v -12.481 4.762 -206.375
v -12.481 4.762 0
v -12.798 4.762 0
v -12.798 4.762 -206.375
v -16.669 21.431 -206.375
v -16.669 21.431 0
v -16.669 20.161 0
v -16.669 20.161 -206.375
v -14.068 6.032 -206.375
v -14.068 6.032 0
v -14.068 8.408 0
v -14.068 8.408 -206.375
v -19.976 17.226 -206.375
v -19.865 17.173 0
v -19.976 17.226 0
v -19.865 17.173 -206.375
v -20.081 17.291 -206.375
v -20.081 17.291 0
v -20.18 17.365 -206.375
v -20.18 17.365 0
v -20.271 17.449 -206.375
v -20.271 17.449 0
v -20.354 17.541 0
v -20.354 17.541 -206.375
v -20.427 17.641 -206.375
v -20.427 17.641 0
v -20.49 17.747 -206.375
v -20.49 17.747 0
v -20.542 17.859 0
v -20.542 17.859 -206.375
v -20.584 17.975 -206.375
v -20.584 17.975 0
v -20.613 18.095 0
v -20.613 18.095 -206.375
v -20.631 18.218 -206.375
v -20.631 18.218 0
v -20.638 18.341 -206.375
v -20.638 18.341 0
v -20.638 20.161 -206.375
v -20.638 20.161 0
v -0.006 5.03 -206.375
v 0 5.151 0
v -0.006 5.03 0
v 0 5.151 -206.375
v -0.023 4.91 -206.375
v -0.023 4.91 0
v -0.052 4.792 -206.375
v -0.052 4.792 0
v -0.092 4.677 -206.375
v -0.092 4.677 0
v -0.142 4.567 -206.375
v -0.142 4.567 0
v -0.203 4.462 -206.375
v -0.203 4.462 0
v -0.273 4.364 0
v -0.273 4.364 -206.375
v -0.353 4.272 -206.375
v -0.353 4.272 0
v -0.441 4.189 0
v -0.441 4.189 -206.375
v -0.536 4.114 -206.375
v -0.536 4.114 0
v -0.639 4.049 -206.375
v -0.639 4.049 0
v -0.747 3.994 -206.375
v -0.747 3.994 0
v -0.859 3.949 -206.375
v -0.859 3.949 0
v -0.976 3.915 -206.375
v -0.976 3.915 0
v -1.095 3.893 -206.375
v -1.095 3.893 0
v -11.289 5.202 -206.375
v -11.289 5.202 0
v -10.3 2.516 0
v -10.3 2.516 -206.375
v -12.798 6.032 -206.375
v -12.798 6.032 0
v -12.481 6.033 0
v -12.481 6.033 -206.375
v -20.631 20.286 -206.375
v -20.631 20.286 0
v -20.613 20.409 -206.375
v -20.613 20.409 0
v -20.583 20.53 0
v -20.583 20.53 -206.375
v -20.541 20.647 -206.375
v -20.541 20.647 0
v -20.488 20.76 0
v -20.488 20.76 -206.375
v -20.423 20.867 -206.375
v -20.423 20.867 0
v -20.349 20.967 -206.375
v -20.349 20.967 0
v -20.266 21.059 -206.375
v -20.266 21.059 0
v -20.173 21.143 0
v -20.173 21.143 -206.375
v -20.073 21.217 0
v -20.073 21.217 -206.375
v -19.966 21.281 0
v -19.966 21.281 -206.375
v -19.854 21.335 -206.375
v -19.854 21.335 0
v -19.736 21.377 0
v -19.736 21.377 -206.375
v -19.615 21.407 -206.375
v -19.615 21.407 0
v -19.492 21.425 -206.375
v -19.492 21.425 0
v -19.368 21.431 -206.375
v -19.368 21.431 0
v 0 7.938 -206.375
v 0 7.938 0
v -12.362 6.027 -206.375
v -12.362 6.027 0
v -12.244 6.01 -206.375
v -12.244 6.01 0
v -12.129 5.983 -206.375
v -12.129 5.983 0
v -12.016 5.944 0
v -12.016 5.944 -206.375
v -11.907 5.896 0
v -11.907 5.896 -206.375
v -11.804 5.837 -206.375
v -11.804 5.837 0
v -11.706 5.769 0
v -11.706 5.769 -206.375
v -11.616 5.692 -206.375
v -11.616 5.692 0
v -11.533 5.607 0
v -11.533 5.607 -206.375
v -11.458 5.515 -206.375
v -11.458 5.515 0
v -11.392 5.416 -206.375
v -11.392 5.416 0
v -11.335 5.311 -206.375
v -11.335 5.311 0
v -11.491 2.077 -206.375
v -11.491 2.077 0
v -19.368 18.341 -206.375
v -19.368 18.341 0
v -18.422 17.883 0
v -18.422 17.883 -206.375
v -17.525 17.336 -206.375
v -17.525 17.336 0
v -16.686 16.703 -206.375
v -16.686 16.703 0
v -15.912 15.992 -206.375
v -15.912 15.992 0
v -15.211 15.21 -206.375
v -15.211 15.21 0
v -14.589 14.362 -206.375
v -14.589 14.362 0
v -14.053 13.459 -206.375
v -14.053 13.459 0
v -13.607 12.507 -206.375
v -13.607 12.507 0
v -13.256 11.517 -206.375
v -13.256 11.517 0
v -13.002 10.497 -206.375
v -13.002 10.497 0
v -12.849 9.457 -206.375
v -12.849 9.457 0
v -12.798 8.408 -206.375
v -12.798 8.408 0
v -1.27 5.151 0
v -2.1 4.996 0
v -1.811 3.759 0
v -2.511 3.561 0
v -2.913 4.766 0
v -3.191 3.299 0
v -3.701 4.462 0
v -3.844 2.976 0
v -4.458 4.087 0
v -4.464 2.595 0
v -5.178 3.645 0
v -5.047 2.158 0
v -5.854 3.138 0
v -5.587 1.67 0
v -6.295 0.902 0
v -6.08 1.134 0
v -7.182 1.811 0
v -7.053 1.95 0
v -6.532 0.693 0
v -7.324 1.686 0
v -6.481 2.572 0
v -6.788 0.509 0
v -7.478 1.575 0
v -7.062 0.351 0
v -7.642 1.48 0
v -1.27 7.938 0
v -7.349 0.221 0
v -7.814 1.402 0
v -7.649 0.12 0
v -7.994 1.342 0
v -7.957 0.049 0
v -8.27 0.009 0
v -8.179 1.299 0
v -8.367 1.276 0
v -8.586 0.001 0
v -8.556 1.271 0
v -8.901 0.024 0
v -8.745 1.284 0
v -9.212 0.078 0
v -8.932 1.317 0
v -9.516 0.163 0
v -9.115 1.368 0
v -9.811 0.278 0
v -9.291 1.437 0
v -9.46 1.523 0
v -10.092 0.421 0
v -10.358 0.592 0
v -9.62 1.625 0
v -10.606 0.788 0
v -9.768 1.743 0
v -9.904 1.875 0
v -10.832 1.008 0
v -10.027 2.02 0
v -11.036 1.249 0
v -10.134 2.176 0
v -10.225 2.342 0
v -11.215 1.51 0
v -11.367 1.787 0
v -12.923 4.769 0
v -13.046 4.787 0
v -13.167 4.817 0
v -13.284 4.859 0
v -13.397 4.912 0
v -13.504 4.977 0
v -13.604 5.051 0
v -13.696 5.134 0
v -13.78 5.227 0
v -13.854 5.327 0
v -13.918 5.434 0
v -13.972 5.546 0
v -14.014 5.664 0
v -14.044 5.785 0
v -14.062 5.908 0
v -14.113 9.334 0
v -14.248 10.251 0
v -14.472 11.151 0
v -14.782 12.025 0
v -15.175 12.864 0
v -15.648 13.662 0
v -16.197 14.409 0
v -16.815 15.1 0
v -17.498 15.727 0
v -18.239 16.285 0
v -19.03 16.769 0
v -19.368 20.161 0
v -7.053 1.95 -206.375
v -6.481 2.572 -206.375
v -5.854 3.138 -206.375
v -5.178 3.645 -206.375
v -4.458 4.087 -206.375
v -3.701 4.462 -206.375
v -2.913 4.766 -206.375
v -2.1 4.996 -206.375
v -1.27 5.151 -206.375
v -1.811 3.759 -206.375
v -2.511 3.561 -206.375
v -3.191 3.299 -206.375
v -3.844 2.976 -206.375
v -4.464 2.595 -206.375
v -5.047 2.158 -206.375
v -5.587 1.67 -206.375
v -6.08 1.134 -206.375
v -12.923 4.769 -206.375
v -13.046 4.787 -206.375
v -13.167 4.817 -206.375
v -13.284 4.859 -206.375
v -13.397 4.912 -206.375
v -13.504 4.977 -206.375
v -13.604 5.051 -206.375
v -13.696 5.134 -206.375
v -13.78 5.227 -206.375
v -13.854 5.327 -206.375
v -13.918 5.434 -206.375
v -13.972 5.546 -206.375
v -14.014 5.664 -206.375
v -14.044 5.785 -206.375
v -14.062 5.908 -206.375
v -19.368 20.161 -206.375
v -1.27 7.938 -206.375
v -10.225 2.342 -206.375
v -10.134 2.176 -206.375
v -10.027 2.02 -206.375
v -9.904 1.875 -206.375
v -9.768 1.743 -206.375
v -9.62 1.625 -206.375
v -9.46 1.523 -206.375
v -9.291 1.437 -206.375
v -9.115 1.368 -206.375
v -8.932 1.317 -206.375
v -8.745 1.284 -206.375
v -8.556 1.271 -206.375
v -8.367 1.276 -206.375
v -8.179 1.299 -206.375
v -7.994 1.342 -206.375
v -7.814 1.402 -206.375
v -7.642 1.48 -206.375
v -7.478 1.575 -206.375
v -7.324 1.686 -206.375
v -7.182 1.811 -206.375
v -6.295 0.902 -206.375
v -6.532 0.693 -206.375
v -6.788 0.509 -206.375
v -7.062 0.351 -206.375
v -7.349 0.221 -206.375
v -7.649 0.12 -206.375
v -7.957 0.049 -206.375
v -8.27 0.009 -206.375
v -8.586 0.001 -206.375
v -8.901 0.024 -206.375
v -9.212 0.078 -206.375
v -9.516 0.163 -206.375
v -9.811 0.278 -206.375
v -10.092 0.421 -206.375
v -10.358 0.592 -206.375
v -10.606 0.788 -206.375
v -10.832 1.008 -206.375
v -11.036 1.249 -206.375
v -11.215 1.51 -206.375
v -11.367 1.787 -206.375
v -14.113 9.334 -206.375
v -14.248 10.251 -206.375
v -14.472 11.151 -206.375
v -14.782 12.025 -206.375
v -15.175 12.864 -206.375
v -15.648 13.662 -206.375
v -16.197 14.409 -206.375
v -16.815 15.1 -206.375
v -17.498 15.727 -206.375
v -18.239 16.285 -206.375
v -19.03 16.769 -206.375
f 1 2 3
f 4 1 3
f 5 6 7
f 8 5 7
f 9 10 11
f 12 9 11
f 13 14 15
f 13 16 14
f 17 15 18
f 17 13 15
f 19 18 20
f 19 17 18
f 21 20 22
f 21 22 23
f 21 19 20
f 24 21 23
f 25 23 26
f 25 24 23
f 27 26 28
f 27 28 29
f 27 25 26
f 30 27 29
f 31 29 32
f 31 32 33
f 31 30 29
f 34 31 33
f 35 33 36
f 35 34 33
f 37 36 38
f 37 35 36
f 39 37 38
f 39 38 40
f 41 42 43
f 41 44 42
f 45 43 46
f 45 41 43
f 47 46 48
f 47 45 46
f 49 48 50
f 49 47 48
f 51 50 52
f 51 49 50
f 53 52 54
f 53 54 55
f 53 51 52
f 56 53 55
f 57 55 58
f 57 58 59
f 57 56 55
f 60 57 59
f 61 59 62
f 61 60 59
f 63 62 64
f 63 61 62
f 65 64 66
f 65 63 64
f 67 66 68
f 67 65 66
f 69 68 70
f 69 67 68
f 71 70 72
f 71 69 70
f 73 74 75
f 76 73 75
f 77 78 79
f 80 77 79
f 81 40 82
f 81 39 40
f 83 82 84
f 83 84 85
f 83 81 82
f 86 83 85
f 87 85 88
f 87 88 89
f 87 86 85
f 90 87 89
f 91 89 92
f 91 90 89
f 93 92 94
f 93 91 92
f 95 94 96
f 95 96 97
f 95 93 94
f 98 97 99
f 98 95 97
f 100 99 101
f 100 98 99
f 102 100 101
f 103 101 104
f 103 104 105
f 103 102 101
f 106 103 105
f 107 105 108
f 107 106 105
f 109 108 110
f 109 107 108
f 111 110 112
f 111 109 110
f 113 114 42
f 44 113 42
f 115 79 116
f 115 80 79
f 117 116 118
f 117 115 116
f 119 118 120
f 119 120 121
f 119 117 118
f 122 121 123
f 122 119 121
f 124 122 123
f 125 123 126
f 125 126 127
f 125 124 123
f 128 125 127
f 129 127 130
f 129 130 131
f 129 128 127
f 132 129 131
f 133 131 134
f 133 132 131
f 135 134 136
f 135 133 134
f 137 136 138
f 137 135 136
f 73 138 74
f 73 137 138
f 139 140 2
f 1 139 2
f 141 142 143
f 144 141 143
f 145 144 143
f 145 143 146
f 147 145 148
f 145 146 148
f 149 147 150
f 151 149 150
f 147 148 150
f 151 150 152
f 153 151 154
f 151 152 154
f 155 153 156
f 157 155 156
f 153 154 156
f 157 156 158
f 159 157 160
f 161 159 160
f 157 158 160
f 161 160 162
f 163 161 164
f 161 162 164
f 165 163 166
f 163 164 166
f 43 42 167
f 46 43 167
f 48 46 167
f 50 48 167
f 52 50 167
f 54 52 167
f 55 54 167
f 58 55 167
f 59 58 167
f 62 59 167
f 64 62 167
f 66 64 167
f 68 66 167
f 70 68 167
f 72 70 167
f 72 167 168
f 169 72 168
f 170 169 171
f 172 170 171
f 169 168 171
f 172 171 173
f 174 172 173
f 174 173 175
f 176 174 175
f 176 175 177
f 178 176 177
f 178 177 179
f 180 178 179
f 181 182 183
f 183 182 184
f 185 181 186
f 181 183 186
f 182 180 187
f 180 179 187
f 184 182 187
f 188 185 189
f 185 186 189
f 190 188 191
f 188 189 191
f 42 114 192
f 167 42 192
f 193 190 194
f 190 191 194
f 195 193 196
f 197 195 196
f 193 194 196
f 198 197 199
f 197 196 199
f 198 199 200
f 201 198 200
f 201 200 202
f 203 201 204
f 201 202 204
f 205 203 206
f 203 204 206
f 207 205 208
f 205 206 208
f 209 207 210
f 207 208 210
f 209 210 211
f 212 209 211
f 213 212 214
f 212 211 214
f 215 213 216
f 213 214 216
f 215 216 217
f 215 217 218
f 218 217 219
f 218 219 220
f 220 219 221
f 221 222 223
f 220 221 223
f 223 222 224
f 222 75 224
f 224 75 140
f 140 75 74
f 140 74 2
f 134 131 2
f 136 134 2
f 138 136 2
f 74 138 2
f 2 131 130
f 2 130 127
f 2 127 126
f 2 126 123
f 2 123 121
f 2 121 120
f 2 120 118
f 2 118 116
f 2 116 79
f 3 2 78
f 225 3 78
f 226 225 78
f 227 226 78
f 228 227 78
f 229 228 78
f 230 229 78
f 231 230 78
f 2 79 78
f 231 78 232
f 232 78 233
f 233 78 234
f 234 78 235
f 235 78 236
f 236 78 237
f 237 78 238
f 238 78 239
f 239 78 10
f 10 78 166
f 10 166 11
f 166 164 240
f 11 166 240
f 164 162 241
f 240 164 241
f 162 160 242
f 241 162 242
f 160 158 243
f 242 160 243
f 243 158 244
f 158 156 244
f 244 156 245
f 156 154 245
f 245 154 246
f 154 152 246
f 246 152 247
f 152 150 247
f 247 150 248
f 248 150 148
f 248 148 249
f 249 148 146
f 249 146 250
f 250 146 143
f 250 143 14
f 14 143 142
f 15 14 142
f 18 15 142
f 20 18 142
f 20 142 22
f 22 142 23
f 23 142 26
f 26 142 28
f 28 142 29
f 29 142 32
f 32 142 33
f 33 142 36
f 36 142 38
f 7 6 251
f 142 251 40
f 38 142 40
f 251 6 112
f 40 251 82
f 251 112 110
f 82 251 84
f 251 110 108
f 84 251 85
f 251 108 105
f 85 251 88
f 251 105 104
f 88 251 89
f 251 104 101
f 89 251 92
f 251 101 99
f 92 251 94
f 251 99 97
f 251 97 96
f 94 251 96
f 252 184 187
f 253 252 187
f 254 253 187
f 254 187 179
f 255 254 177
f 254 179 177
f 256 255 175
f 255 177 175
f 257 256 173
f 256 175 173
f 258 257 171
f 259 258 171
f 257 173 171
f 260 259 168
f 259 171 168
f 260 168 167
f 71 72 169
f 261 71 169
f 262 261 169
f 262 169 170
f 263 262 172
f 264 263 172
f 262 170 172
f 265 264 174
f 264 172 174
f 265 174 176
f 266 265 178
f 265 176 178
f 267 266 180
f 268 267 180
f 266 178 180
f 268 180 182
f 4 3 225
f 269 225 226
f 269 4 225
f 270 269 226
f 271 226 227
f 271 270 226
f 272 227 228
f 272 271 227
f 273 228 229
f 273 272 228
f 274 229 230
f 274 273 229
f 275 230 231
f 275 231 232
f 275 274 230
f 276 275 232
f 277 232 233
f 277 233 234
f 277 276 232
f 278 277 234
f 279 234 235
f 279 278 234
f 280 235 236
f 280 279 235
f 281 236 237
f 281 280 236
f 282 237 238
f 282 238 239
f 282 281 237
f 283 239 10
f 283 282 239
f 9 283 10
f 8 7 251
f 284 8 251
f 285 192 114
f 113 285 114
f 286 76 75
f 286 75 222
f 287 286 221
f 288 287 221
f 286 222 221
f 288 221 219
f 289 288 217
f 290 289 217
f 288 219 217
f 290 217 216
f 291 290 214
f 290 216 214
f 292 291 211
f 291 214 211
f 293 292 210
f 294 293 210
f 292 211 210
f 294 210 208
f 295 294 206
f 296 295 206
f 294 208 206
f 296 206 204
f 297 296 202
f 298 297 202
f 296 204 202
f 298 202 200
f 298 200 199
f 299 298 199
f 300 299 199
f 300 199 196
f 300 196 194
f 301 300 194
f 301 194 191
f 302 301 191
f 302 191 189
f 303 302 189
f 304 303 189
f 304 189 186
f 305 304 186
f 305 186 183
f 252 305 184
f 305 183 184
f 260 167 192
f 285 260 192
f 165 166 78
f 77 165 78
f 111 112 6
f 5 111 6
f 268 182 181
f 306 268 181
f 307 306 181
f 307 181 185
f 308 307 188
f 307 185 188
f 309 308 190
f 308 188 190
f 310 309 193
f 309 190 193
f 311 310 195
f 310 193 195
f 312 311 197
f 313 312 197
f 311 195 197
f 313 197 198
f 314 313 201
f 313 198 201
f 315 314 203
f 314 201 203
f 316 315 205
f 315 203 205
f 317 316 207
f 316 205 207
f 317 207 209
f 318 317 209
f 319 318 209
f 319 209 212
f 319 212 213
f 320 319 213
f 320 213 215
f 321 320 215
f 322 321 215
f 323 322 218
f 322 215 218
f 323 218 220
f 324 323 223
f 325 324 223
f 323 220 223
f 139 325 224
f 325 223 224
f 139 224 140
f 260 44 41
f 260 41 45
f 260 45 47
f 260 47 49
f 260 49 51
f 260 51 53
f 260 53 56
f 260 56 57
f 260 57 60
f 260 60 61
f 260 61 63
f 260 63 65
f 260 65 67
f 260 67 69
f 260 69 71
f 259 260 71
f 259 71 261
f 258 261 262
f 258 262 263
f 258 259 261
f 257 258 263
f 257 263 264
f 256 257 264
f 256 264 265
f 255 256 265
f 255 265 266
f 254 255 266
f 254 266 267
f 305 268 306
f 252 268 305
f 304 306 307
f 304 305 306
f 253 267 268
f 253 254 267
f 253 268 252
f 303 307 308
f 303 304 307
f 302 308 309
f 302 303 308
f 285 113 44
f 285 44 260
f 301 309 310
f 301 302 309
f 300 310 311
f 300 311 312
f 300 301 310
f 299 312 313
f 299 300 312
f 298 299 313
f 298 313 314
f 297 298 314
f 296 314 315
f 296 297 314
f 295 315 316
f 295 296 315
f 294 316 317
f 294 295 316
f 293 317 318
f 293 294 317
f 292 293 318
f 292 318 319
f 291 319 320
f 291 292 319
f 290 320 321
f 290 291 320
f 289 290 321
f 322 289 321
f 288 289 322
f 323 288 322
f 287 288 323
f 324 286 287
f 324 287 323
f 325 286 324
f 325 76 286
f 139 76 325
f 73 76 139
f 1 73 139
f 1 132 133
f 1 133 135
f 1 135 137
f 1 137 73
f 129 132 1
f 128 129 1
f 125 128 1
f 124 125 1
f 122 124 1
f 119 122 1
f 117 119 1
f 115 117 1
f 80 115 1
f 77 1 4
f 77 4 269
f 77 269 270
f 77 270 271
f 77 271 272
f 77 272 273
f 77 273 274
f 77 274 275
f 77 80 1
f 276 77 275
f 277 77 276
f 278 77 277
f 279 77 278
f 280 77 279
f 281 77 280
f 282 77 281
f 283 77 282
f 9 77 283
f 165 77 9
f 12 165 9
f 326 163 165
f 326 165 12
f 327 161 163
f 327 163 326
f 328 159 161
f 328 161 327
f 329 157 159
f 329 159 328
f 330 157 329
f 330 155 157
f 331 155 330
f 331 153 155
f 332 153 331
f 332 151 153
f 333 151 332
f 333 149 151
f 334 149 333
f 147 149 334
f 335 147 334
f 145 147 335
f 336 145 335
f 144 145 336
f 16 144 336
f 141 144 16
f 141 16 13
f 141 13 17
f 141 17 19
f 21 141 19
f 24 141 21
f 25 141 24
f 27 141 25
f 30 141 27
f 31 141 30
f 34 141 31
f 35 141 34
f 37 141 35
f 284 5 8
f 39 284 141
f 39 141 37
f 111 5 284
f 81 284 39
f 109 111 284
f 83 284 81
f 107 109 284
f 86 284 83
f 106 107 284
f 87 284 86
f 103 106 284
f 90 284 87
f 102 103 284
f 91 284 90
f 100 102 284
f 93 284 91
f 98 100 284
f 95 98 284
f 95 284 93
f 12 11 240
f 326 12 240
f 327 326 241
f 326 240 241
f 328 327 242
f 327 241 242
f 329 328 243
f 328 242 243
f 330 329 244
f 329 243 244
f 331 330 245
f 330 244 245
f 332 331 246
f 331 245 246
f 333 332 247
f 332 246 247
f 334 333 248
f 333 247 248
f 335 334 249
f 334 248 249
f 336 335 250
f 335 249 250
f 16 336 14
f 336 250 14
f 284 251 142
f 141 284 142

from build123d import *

# Parameters (mm, degrees)
EXTRUDE_THIN1_DEPTH = 206.375
FILLET1_R           = 1.27


with BuildPart() as part:
    # Sketch1 → Extrude-Thin1 (new body)
    with BuildSketch(Plane.XY):
        with BuildLine():
            Line((0, 7.9375), (0, 3.96875))
            ThreePointArc((0, 3.96875), (-3.354205948, 3.225220302), (-6.080014609, 1.133928571))
            ThreePointArc((-6.080014609, 1.133928571), (-9.057226525, 0.047161235), (-11.491167025, 2.077133569))
            Line((-11.491167025, 2.077133569), (-12.480770453, 4.7625))
            Line((-12.480770453, 4.7625), (-14.068270453, 4.7625))
            Line((-14.068270453, 4.7625), (-14.068270453, 8.407719714))
            ThreePointArc((-14.068270453, 8.407719714), (-15.883557794, 14.00110471), (-20.6375, 17.4625))
            Line((-20.6375, 17.4625), (-20.6375, 21.43125))
            Line((-20.6375, 21.43125), (-16.66875, 21.43125))
            Line((-16.66875, 21.43125), (-16.66875, 20.16125))
            Line((-16.66875, 20.16125), (-19.3675, 20.16125))
            Line((-19.3675, 20.16125), (-19.3675, 18.341243212))
            ThreePointArc((-19.3675, 18.341243212), (-14.589126489, 14.362332756), (-12.798270453, 8.407719714))
            Line((-12.798270453, 8.407719714), (-12.798270453, 6.0325))
            Line((-12.798270453, 6.0325), (-11.595295513, 6.0325))
            Line((-11.595295513, 6.0325), (-10.299508396, 2.516280141))
            ThreePointArc((-10.299508396, 2.516280141), (-8.839144096, 1.298296741), (-7.052816947, 1.950357143))
            ThreePointArc((-7.052816947, 1.950357143), (-4.458468146, 4.08731095), (-1.27, 5.150743201))
            Line((-1.27, 5.150743201), (-1.27, 7.9375))
            Line((-1.27, 7.9375), (0, 7.9375))
        make_face()
    extrude(amount=-EXTRUDE_THIN1_DEPTH)

    # Fillet1
    fillet1_edges = [part.edges().sort_by_distance(p)[0] for p in [
        (-11.595295513, 6.0325, -103.1875),
        (0, 3.96875, -103.1875),
        (-14.068270453, 4.7625, -103.1875),
        (-20.6375, 17.4625, -103.1875),
        (-20.6375, 21.43125, -103.1875),
    ]]
    fillet(fillet1_edges, radius=FILLET1_R)


solid = part.part
